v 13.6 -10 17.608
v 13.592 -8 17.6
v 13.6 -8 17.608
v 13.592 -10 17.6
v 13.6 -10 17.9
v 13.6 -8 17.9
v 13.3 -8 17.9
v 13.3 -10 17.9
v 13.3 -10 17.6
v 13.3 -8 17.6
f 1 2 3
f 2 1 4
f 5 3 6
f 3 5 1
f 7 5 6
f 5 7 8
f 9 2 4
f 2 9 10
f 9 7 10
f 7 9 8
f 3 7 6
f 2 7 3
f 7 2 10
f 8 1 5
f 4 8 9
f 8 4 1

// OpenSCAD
// Printability: the Z column overhangs the x-slider block by
// (col_w - xs_len) / 2 on each X side. A 45 deg support must fill under
// the overhang: material just below the column, near its outer edge, on
// the +X side. Must render non-empty.
include <../stage.scad>
intersection() {
    stage_x_slider();
    translate([xs_xc + (1) * (col_w / 2 - 0.55) - 0.15, (col_y0 + col_y1) / 2 - 1, xs_top - 0.4]) cube([0.3, 2, 0.3]);
}
